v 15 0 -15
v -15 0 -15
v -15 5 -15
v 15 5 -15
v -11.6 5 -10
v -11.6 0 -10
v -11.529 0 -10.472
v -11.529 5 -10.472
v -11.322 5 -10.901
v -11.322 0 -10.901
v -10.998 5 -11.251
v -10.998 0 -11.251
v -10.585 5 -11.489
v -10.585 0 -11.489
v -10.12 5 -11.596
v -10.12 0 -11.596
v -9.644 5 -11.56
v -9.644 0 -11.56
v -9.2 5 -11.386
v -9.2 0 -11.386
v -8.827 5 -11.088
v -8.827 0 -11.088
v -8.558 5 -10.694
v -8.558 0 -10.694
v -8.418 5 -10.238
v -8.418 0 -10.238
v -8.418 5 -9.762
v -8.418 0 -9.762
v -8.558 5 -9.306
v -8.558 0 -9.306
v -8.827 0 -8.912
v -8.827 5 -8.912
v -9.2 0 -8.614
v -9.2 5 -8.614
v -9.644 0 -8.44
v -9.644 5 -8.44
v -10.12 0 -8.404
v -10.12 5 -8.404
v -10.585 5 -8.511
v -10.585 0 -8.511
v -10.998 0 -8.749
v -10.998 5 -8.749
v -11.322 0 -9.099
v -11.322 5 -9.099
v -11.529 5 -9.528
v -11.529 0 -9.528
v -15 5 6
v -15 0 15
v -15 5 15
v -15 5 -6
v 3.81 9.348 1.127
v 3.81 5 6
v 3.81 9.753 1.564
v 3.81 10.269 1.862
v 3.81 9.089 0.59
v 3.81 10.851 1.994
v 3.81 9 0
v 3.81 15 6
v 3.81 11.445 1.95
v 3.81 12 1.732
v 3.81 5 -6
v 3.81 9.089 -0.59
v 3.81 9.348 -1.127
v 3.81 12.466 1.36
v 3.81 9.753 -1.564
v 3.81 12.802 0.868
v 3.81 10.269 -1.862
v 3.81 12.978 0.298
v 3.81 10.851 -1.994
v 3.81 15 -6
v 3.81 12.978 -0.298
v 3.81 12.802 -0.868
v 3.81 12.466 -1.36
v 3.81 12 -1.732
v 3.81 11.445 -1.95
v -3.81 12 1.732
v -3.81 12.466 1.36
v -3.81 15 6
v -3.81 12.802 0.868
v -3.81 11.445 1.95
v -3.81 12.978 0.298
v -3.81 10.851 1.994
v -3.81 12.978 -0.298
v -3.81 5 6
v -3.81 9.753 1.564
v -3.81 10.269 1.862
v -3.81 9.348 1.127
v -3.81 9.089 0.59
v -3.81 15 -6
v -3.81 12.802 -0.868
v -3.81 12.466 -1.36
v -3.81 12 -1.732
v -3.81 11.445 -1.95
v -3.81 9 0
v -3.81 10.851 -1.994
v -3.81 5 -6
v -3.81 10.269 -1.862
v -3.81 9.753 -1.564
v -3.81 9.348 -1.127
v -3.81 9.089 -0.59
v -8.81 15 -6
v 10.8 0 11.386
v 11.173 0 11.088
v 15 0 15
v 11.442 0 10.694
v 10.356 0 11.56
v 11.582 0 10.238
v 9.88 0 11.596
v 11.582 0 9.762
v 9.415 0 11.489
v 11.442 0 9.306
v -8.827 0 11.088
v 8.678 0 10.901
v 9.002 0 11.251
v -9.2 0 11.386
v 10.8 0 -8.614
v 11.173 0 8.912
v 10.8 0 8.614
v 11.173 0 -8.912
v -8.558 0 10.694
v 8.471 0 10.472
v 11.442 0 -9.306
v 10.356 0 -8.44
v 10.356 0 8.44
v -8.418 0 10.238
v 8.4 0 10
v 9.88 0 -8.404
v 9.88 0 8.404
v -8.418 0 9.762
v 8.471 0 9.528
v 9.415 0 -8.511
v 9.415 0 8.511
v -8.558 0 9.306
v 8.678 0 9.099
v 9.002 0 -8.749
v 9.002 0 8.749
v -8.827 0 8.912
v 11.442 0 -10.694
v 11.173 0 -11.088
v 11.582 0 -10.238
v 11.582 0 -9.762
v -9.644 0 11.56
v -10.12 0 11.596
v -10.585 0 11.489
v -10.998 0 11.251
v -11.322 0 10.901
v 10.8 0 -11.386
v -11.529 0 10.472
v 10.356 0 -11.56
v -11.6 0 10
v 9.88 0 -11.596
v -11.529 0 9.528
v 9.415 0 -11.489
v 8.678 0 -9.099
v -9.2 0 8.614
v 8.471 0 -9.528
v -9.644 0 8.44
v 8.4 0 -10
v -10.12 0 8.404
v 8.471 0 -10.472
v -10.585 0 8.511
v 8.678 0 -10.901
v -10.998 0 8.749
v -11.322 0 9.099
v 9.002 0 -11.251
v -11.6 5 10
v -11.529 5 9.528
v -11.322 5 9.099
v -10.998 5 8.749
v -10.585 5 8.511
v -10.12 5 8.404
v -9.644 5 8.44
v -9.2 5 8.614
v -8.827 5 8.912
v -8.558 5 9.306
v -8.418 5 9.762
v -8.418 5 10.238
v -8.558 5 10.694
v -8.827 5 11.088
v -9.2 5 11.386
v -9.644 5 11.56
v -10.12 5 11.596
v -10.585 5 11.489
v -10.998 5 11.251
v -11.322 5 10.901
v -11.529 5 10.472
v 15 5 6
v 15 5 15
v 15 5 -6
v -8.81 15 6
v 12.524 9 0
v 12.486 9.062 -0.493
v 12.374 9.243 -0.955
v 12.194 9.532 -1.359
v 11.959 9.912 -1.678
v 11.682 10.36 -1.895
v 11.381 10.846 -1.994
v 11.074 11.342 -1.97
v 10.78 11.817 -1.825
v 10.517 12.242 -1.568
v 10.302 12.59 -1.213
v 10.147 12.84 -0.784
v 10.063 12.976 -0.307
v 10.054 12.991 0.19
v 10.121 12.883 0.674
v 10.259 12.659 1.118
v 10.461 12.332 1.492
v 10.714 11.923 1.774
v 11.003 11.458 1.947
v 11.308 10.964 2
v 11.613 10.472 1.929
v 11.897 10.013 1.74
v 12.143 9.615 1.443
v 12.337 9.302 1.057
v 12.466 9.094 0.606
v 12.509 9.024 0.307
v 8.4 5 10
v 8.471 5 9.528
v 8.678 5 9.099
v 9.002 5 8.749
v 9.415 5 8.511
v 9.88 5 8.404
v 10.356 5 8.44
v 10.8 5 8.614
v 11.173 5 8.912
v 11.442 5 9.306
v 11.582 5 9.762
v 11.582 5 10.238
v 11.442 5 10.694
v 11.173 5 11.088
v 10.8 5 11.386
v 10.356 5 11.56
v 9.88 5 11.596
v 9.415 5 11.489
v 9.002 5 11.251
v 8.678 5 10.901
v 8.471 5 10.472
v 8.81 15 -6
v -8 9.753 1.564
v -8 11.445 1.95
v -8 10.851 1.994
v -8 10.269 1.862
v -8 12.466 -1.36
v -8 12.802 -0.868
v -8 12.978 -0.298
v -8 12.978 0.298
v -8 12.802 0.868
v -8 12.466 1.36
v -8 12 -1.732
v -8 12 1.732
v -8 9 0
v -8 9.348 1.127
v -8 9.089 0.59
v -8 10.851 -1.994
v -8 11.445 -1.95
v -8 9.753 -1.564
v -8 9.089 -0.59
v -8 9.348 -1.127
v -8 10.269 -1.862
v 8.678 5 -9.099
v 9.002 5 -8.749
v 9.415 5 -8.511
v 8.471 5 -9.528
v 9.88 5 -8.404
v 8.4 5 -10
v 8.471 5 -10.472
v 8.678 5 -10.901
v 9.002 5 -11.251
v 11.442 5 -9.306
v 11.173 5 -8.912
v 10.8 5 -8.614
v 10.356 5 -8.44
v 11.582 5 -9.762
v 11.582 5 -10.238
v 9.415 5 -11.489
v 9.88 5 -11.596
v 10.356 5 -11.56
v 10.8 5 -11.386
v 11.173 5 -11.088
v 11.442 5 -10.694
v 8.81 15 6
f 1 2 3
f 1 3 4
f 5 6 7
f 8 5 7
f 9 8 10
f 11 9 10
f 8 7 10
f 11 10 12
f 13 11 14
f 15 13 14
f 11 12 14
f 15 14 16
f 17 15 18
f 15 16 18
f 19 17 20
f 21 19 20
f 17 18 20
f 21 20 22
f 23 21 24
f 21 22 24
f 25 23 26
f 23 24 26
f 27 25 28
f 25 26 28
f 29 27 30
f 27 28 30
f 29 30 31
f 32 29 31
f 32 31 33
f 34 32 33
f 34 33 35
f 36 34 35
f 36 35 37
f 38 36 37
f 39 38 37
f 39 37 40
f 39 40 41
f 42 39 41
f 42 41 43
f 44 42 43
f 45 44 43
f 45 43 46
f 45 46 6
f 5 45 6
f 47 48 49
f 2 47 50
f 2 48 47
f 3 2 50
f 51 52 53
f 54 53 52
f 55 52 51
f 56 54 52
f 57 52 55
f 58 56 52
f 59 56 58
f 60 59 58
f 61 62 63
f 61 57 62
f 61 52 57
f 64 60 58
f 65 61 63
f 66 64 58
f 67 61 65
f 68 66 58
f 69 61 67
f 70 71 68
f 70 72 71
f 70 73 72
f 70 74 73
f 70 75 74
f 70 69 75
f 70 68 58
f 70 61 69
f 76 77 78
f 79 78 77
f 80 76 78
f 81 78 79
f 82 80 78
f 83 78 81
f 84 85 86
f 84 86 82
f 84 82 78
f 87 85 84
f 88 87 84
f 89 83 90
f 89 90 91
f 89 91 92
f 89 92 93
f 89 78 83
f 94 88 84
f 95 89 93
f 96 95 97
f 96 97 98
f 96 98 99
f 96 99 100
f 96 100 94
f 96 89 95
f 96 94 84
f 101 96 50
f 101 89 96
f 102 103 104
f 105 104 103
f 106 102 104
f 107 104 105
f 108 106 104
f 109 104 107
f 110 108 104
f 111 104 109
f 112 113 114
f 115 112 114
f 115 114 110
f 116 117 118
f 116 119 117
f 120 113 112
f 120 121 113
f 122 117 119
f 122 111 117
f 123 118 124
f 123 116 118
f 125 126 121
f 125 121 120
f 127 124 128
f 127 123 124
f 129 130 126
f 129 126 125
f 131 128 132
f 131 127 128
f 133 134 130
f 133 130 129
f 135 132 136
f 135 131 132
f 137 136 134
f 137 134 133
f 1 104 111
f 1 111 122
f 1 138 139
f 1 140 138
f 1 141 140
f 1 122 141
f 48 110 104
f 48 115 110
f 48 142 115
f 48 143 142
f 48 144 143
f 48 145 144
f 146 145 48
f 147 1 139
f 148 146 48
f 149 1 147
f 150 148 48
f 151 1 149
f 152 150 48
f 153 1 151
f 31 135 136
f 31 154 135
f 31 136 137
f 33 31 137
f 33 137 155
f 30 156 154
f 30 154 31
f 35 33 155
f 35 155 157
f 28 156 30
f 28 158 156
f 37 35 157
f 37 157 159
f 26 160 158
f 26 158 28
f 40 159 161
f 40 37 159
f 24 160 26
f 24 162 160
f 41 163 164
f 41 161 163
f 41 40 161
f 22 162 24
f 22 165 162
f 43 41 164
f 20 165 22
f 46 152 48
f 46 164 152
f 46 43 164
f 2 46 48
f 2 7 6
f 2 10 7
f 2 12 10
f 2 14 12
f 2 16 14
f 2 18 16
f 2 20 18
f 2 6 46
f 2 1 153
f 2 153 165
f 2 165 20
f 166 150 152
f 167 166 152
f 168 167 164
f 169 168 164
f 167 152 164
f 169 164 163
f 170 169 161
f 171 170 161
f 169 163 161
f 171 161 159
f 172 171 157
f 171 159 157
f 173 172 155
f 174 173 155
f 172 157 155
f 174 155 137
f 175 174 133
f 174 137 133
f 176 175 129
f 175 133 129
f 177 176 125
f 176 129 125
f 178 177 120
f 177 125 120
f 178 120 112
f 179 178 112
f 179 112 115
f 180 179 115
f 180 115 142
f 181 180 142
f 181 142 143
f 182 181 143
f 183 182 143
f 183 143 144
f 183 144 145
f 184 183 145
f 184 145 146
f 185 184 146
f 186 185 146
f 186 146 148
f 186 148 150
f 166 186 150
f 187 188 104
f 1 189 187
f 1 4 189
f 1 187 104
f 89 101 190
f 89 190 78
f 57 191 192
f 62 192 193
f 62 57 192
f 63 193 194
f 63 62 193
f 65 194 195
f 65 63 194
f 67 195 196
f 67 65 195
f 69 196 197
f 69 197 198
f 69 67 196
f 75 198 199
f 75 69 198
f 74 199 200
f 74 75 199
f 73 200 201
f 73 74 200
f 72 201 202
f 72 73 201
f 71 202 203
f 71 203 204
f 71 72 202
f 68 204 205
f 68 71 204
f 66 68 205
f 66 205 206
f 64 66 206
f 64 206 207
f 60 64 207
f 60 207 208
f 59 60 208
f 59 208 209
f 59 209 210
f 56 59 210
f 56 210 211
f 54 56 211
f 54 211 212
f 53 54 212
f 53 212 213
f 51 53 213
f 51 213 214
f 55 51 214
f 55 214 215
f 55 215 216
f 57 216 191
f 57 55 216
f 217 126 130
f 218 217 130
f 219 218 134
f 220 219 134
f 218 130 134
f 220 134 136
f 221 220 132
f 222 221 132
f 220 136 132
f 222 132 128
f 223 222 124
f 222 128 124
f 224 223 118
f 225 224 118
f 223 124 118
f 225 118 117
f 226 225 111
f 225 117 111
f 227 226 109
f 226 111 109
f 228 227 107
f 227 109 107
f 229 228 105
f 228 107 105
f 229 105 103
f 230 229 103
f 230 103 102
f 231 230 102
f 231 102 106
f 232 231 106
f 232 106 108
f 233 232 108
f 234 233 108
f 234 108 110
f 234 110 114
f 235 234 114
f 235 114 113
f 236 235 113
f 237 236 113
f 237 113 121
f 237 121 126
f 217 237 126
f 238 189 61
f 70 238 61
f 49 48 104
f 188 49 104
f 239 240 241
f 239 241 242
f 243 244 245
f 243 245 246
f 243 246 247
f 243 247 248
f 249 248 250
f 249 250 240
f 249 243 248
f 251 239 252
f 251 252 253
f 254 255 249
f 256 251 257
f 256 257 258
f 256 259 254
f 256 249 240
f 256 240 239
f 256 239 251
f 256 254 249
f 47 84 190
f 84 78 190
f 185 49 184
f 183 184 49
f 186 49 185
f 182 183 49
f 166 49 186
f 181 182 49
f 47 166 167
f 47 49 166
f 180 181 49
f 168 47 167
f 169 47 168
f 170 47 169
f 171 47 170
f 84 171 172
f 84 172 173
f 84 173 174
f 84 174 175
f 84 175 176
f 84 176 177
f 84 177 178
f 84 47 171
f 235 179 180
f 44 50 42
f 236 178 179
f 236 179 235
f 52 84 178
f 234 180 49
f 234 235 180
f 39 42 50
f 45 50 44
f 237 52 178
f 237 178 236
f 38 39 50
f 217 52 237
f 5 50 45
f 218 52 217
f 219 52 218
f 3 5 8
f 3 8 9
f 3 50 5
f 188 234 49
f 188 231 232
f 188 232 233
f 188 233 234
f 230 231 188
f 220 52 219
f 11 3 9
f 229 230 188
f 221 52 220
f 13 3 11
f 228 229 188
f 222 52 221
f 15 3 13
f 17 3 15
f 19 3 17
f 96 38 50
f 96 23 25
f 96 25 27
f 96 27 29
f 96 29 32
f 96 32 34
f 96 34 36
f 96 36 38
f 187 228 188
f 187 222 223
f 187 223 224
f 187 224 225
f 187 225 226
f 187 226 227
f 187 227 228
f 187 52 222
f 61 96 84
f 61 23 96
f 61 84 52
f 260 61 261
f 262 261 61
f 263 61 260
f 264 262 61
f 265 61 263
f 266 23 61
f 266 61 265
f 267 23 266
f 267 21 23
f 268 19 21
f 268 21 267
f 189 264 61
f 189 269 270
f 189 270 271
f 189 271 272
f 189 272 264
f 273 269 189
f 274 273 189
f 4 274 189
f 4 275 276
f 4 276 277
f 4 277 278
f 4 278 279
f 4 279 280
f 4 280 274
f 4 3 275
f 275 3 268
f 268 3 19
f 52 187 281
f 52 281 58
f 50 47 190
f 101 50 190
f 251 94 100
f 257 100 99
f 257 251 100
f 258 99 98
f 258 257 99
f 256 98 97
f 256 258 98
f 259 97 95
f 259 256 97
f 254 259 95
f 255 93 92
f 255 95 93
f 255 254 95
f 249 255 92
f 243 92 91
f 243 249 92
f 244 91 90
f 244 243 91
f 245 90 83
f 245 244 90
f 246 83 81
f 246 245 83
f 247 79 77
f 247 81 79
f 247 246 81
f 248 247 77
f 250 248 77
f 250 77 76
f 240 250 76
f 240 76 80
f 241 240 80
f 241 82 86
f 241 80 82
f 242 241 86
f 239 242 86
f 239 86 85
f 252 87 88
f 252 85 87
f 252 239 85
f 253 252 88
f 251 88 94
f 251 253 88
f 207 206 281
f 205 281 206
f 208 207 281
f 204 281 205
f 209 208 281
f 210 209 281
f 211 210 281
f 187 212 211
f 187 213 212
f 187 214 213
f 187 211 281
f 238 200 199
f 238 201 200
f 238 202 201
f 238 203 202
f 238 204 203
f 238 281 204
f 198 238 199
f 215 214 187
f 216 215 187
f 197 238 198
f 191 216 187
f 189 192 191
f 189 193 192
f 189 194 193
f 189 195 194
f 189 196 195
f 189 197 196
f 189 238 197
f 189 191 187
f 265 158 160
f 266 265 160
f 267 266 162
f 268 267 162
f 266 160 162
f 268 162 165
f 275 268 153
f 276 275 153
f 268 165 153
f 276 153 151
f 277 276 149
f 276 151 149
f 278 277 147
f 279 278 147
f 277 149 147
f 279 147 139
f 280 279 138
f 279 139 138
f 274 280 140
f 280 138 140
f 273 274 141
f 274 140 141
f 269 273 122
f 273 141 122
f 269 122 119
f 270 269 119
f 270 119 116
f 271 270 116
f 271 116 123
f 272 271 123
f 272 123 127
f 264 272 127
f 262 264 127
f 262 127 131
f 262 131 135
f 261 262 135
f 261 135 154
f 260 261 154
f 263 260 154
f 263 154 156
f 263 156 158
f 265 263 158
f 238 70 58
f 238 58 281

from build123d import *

# Parameters (mm, degrees)
SKETCH1_W                = 30
SKETCH1_H                = 30
BOSS_EXTRUDE1_DEPTH      = 5
BOSS_EXTRUDE2_DEPTH      = 6
BOSS_EXTRUDE2_DEPTH_BACK = 6
M3_CLEARANCE_HOLE1_D     = 3.2
CUT_EXTRUDE1_DEPTH       = 26.980762114
CUT_EXTRUDE1_DEPTH_BACK  = 8
SKETCH5_R                = 2


with BuildPart() as part:
    # Sketch1 → Boss-Extrude1 (new body)
    with BuildSketch(Plane(origin=(0, 0, 0), x_dir=(1, 0, 0), z_dir=(0, 1, 0))):
        Rectangle(SKETCH1_W, SKETCH1_H)
    extrude(amount=BOSS_EXTRUDE1_DEPTH)

    # Sketch2 → Boss-Extrude2 (add, two sides: drawn at the far end of the back side and taken through both)
    with BuildSketch(Plane.XY.offset(-BOSS_EXTRUDE2_DEPTH_BACK)):
        Polygon((15, 0), (-15, 0), (-15, 5), (-8.81, 15), (-3.81, 15), (-3.81, 5), (3.81, 5), (3.81, 15), (8.81, 15), (15, 5), align=None)
    extrude(amount=BOSS_EXTRUDE2_DEPTH + BOSS_EXTRUDE2_DEPTH_BACK)

    # M3 Clearance Hole1 (through all)
    with Locations(Plane(origin=(0, 5, 0), x_dir=(1, 0, 0), z_dir=(0, 1, 0))):
        with Locations((-10, 10), (10, 10), (10, -10), (-10, -10)):
            Hole(M3_CLEARANCE_HOLE1_D / 2)

    # Sketch5 → Cut-Extrude1 (cut, two sides: drawn at the far end of the back side and taken through both)
    with BuildSketch(Plane(origin=(0, 0, 0), x_dir=(0, 0, -1), z_dir=(1, 0, 0)).offset(-CUT_EXTRUDE1_DEPTH_BACK)):
        with Locations(Location((0, 11, 0), (0, 0, 270))):
            Circle(SKETCH5_R)
    extrude(amount=CUT_EXTRUDE1_DEPTH + CUT_EXTRUDE1_DEPTH_BACK, mode=Mode.SUBTRACT)


solid = part.part
